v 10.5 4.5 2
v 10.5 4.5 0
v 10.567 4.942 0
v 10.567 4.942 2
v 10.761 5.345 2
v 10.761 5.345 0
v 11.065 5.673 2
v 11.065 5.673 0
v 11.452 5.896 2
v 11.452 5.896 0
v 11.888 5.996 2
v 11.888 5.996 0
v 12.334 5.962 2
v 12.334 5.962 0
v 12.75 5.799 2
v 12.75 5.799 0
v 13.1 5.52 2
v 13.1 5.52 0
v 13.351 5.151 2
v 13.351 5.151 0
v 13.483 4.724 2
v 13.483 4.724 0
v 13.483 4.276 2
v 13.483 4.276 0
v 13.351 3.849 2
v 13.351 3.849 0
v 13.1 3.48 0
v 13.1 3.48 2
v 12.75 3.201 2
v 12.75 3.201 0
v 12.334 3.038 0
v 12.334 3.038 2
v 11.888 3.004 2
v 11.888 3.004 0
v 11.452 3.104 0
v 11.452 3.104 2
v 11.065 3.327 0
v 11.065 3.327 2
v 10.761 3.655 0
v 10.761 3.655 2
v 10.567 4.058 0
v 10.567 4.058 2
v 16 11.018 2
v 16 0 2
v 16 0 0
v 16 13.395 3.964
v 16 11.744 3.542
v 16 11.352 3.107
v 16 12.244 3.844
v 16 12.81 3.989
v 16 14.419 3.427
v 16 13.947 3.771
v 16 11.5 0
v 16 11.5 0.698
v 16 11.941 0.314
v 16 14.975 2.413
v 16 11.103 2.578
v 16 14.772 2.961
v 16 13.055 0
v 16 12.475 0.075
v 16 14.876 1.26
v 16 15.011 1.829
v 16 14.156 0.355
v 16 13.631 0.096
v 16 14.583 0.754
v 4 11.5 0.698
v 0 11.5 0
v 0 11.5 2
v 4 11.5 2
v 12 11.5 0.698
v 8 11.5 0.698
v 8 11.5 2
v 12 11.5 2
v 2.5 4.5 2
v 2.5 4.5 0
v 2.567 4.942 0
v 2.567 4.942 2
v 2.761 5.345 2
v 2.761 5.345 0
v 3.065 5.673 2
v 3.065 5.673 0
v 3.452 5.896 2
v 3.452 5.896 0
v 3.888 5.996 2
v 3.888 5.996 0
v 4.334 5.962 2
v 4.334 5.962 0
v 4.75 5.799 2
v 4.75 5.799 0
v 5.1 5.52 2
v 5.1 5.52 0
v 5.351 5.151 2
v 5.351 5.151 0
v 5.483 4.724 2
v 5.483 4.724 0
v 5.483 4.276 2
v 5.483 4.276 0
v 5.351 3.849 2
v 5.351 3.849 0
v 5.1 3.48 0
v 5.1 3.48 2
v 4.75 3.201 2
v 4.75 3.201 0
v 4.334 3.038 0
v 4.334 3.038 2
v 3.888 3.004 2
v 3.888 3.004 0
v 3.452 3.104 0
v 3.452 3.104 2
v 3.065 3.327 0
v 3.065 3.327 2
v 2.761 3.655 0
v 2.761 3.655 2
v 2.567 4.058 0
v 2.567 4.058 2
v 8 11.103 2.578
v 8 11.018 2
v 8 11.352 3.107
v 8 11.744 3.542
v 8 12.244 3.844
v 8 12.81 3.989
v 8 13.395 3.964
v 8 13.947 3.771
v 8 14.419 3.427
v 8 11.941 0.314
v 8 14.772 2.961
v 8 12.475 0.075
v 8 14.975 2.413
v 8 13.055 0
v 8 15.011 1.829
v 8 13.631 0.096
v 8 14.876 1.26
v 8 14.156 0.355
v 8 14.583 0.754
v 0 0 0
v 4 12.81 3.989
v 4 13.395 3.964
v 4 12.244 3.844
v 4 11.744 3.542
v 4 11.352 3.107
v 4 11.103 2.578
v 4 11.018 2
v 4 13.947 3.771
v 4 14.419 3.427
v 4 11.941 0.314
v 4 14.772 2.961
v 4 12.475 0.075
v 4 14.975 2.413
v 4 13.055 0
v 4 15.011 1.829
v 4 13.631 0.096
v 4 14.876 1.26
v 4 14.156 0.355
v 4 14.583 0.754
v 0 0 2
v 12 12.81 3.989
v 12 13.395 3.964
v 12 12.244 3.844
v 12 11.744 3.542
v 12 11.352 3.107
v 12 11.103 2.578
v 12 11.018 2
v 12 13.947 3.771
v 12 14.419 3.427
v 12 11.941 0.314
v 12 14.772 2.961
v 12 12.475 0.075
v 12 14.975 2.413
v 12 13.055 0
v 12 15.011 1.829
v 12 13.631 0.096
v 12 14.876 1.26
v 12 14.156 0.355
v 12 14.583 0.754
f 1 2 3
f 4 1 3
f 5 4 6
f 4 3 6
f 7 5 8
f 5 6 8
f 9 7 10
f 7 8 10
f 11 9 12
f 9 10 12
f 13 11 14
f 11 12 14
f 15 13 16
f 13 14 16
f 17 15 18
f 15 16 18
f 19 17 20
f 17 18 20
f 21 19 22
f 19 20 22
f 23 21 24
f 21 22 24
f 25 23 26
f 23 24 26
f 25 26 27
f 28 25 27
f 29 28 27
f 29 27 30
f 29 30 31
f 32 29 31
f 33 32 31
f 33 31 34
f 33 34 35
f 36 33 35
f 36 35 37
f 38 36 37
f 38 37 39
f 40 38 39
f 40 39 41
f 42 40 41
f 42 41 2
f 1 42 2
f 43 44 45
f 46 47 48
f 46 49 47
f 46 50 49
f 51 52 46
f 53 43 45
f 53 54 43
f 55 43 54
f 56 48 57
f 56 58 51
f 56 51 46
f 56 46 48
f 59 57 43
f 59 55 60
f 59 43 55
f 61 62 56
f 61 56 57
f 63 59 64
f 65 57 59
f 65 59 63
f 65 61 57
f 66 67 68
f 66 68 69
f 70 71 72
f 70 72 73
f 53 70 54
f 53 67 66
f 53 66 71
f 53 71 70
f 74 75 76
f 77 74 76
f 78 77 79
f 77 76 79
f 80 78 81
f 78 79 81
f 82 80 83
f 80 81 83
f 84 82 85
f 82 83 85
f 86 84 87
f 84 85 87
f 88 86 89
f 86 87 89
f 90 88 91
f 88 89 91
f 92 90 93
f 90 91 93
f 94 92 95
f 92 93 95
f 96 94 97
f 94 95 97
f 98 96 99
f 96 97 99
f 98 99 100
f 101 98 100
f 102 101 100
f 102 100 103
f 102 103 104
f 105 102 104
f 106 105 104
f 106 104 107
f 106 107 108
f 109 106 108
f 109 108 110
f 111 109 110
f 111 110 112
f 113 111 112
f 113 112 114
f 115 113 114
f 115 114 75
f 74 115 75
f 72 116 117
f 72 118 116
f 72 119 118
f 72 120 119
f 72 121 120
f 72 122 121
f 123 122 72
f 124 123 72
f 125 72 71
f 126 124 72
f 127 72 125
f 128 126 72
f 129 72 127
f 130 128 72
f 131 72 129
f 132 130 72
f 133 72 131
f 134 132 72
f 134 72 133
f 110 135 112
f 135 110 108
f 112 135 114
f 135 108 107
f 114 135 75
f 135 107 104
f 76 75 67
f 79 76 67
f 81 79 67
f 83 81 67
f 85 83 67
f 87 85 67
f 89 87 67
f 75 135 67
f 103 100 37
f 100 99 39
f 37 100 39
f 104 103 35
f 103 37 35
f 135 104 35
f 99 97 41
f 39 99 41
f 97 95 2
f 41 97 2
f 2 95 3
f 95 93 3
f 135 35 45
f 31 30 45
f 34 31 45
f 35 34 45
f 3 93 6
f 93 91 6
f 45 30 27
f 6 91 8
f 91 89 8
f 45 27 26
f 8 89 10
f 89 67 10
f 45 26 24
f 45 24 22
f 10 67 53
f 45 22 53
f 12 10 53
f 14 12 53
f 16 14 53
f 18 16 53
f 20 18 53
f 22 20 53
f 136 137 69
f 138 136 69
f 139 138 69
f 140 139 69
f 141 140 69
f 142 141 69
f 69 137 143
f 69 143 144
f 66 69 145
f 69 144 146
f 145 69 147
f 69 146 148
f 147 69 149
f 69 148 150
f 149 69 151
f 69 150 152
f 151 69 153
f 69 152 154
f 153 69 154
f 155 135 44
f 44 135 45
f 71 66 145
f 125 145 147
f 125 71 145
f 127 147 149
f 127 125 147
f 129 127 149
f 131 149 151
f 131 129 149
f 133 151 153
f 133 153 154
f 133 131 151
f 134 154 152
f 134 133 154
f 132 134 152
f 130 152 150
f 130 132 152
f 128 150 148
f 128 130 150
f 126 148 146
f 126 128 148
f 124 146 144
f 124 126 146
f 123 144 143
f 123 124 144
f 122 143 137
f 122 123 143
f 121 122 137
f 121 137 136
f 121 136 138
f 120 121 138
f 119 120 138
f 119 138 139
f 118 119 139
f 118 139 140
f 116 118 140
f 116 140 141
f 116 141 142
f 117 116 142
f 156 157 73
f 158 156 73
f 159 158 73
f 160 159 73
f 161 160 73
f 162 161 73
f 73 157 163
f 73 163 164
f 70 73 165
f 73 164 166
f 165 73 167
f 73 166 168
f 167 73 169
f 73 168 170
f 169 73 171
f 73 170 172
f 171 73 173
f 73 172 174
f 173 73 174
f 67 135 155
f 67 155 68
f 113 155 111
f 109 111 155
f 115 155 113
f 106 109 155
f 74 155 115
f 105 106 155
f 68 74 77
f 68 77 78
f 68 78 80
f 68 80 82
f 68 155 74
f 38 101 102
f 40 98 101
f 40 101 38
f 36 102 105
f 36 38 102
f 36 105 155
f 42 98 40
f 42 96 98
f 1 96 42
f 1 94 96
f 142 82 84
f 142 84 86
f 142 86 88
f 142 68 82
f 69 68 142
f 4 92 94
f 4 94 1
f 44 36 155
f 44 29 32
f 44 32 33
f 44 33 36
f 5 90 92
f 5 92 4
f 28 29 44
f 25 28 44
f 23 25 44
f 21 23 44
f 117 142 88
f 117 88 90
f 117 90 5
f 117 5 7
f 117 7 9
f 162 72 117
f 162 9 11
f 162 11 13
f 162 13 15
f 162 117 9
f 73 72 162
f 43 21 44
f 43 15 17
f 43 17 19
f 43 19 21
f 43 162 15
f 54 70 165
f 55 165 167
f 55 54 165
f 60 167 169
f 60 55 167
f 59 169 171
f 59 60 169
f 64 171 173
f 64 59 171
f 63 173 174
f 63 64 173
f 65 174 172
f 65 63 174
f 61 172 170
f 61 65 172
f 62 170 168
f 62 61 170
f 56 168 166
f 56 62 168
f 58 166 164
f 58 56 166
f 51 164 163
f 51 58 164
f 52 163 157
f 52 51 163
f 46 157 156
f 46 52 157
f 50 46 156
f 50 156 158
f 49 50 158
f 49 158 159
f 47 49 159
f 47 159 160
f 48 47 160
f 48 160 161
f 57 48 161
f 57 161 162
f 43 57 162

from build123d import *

# Parameters (mm, degrees)
SKETCH1_W             = 16
SKETCH1_H             = 11.5
BOSS_EXTRUDE1_DEPTH   = 2
SKETCH2_R             = 2
BOSS_EXTRUDE2_DEPTH   = 4
LPATTERN1_COUNT       = 2
LPATTERN1_PITCH       = 8
F_3_0MM_DOWEL_HOLE1_D = 3


with BuildPart() as part:
    # Sketch1 → Boss-Extrude1 (new body)
    with BuildSketch(Plane.XY):
        with Locations((8, 5.75)):
            Rectangle(SKETCH1_W, SKETCH1_H)
    extrude(amount=BOSS_EXTRUDE1_DEPTH)

    # Sketch2 → Boss-Extrude2 (add)
    with BuildSketch(Plane(origin=(16, 0, 0), x_dir=(0, 0, -1), z_dir=(1, 0, 0))):
        with Locations((-2, 13.01793751)):
            Circle(SKETCH2_R)
    boss_extrude2 = extrude(amount=-BOSS_EXTRUDE2_DEPTH)

    # LPattern1: Boss-Extrude2 ×2
    with Locations(*[(-i * LPATTERN1_PITCH, 0, 0) for i in range(1, LPATTERN1_COUNT)]):
        add(boss_extrude2)

    # Ø3.0mm Dowel Hole1 (through all)
    with Locations(Plane.XY.offset(2)):
        with Locations((4, 4.5), (12, 4.5)):
            Hole(F_3_0MM_DOWEL_HOLE1_D / 2)


solid = part.part
